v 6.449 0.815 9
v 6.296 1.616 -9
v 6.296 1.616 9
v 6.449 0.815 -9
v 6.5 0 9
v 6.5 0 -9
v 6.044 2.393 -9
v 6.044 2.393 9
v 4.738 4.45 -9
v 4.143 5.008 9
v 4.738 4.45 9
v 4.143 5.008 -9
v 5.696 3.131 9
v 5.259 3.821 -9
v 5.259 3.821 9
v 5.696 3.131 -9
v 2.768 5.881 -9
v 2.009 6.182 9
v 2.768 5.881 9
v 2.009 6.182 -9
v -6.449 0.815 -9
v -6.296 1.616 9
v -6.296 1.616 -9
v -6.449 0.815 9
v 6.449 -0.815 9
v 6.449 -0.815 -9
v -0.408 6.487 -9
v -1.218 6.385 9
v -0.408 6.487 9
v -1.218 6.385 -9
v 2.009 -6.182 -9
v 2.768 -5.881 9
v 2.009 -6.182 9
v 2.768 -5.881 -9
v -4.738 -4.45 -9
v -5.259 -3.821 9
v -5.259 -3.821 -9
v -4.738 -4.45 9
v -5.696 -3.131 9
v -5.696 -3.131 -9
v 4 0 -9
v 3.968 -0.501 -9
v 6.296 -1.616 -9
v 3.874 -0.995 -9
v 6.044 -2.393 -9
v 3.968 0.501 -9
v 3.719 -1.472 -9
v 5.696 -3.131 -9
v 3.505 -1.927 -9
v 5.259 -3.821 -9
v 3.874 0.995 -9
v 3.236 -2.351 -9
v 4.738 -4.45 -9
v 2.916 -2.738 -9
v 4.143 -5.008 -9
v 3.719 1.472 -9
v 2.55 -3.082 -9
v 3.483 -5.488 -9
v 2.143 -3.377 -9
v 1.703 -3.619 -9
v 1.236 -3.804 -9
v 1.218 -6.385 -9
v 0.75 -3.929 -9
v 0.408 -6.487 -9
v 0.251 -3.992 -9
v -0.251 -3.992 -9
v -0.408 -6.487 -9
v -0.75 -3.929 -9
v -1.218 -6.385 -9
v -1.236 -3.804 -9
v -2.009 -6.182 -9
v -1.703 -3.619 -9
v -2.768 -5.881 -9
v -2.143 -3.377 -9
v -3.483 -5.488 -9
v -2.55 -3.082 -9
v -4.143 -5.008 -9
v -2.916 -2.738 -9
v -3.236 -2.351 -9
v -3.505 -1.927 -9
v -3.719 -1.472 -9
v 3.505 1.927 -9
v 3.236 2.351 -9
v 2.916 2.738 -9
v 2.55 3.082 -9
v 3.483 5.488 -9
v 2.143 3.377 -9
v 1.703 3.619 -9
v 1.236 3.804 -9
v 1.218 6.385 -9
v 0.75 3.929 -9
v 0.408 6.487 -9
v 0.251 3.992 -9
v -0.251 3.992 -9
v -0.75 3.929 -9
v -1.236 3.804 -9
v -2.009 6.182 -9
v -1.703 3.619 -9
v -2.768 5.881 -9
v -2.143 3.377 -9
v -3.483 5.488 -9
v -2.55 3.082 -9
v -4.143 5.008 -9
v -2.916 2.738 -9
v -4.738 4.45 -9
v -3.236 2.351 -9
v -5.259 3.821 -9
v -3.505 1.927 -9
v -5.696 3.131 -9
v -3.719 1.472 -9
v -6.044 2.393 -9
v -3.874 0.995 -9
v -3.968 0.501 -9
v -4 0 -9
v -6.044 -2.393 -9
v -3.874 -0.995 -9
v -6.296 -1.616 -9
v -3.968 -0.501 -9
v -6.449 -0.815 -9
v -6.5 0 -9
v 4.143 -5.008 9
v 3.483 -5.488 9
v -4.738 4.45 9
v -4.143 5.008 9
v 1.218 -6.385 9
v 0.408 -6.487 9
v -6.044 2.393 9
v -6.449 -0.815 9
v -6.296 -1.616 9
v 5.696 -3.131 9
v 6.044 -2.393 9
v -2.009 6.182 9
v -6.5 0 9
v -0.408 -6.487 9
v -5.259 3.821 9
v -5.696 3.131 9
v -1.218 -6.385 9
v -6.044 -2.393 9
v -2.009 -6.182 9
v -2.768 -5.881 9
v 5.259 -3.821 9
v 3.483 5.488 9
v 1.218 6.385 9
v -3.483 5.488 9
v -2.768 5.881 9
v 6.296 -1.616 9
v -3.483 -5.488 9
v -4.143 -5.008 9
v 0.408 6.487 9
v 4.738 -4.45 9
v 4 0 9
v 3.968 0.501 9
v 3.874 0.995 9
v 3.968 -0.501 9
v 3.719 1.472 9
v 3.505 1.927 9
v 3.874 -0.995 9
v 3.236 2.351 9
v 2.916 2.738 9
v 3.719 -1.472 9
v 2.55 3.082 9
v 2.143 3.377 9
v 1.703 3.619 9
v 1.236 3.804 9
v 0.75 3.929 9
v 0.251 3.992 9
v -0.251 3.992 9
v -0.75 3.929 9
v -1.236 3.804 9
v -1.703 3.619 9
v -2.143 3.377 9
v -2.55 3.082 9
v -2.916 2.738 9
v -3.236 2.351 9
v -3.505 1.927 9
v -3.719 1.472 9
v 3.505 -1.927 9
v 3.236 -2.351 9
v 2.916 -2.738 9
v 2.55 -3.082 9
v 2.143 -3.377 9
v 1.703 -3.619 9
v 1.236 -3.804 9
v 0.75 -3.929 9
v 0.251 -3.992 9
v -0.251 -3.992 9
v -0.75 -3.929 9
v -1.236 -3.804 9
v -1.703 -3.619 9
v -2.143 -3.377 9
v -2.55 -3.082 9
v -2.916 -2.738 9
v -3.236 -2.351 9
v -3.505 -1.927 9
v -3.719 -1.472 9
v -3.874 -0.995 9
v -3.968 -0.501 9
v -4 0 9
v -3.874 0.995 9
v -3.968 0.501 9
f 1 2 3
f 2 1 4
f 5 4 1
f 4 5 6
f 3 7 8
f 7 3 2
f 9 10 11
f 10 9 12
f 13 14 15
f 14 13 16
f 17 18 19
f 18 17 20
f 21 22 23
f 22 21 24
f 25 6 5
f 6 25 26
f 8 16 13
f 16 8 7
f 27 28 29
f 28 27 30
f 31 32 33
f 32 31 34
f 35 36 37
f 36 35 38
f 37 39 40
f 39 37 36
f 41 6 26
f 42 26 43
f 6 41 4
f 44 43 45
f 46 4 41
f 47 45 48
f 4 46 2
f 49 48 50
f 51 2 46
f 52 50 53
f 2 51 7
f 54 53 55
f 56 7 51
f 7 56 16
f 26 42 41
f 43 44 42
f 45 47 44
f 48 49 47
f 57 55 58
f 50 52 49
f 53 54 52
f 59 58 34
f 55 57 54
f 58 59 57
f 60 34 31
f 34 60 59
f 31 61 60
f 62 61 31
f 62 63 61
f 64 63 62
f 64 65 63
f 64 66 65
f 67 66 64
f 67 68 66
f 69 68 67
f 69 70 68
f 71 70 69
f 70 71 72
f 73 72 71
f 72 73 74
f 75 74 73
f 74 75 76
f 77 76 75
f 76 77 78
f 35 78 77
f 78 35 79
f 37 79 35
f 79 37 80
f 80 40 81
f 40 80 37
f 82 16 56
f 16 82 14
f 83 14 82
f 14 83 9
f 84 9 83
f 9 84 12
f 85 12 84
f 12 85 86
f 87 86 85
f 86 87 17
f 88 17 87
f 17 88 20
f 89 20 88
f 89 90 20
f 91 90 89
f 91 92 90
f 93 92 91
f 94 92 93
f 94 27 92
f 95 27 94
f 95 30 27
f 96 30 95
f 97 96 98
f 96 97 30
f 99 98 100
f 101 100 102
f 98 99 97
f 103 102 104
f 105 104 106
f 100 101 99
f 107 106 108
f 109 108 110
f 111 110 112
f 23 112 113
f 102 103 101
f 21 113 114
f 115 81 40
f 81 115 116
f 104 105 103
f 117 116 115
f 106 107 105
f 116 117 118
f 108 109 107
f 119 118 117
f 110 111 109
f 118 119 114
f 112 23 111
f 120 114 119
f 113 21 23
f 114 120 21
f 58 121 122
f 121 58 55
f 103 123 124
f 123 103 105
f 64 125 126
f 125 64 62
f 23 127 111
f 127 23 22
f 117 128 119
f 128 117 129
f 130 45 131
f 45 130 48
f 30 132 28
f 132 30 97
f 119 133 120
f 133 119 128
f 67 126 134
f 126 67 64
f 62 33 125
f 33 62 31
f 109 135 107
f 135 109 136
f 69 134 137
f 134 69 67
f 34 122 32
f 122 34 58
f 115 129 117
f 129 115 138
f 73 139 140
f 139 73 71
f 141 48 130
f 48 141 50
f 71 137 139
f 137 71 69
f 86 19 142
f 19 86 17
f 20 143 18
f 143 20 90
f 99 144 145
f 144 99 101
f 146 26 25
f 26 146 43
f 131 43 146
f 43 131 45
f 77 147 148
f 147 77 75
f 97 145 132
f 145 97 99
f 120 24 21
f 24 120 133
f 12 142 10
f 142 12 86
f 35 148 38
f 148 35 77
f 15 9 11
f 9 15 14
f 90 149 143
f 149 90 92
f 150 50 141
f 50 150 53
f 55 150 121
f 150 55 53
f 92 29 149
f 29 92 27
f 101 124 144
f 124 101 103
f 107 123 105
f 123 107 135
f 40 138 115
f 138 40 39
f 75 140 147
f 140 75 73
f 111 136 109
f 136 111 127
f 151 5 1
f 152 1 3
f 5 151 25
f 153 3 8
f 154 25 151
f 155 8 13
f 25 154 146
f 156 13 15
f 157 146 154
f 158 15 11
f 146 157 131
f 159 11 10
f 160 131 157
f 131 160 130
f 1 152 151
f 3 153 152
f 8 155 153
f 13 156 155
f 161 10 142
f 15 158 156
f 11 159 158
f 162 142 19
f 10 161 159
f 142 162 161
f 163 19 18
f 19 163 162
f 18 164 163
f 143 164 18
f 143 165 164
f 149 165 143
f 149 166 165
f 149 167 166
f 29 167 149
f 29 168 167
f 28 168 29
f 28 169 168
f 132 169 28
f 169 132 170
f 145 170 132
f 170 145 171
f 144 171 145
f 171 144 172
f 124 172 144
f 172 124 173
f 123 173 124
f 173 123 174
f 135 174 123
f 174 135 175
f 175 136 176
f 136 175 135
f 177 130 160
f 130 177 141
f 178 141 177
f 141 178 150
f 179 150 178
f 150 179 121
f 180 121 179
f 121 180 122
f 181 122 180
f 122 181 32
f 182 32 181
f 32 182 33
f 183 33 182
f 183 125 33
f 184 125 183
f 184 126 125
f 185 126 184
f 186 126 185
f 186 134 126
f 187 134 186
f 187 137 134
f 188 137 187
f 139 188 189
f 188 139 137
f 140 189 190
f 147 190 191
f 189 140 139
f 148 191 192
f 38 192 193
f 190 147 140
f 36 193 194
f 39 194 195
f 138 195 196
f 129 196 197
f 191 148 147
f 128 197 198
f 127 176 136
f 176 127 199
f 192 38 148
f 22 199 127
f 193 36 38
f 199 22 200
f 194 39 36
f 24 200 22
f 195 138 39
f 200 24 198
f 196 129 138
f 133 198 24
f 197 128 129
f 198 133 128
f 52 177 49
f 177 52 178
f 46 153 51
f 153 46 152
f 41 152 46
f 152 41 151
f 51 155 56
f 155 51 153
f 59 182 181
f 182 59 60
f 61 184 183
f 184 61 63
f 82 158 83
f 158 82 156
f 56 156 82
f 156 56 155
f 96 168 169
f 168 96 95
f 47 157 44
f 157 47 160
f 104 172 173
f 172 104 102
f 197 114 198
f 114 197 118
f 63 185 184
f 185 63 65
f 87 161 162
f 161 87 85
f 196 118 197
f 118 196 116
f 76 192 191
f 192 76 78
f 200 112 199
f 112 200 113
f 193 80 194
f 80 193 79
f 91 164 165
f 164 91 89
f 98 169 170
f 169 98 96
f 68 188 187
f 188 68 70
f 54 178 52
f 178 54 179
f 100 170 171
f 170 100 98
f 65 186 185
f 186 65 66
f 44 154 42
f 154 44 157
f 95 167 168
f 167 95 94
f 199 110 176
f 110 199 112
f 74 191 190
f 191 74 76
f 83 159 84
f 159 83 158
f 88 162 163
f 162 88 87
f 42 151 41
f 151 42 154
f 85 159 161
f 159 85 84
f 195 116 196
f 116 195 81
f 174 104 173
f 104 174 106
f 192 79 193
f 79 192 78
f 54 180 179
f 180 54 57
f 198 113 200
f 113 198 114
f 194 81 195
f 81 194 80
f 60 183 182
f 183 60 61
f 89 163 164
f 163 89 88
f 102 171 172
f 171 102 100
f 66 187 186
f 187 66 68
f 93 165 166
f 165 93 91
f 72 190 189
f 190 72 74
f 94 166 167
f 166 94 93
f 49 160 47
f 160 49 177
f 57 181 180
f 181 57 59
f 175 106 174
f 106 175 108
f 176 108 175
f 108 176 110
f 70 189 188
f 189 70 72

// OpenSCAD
$fn = 50;


difference() {
	union() {
		translate(v = [0, 0, -9.0000000000]) {
			cylinder(h = 18, r = 6.5000000000);
		}
	}
	union() {
		translate(v = [0, 0, -100.0000000000]) {
			cylinder(h = 200, r = 4.0000000000);
		}
	}
}
